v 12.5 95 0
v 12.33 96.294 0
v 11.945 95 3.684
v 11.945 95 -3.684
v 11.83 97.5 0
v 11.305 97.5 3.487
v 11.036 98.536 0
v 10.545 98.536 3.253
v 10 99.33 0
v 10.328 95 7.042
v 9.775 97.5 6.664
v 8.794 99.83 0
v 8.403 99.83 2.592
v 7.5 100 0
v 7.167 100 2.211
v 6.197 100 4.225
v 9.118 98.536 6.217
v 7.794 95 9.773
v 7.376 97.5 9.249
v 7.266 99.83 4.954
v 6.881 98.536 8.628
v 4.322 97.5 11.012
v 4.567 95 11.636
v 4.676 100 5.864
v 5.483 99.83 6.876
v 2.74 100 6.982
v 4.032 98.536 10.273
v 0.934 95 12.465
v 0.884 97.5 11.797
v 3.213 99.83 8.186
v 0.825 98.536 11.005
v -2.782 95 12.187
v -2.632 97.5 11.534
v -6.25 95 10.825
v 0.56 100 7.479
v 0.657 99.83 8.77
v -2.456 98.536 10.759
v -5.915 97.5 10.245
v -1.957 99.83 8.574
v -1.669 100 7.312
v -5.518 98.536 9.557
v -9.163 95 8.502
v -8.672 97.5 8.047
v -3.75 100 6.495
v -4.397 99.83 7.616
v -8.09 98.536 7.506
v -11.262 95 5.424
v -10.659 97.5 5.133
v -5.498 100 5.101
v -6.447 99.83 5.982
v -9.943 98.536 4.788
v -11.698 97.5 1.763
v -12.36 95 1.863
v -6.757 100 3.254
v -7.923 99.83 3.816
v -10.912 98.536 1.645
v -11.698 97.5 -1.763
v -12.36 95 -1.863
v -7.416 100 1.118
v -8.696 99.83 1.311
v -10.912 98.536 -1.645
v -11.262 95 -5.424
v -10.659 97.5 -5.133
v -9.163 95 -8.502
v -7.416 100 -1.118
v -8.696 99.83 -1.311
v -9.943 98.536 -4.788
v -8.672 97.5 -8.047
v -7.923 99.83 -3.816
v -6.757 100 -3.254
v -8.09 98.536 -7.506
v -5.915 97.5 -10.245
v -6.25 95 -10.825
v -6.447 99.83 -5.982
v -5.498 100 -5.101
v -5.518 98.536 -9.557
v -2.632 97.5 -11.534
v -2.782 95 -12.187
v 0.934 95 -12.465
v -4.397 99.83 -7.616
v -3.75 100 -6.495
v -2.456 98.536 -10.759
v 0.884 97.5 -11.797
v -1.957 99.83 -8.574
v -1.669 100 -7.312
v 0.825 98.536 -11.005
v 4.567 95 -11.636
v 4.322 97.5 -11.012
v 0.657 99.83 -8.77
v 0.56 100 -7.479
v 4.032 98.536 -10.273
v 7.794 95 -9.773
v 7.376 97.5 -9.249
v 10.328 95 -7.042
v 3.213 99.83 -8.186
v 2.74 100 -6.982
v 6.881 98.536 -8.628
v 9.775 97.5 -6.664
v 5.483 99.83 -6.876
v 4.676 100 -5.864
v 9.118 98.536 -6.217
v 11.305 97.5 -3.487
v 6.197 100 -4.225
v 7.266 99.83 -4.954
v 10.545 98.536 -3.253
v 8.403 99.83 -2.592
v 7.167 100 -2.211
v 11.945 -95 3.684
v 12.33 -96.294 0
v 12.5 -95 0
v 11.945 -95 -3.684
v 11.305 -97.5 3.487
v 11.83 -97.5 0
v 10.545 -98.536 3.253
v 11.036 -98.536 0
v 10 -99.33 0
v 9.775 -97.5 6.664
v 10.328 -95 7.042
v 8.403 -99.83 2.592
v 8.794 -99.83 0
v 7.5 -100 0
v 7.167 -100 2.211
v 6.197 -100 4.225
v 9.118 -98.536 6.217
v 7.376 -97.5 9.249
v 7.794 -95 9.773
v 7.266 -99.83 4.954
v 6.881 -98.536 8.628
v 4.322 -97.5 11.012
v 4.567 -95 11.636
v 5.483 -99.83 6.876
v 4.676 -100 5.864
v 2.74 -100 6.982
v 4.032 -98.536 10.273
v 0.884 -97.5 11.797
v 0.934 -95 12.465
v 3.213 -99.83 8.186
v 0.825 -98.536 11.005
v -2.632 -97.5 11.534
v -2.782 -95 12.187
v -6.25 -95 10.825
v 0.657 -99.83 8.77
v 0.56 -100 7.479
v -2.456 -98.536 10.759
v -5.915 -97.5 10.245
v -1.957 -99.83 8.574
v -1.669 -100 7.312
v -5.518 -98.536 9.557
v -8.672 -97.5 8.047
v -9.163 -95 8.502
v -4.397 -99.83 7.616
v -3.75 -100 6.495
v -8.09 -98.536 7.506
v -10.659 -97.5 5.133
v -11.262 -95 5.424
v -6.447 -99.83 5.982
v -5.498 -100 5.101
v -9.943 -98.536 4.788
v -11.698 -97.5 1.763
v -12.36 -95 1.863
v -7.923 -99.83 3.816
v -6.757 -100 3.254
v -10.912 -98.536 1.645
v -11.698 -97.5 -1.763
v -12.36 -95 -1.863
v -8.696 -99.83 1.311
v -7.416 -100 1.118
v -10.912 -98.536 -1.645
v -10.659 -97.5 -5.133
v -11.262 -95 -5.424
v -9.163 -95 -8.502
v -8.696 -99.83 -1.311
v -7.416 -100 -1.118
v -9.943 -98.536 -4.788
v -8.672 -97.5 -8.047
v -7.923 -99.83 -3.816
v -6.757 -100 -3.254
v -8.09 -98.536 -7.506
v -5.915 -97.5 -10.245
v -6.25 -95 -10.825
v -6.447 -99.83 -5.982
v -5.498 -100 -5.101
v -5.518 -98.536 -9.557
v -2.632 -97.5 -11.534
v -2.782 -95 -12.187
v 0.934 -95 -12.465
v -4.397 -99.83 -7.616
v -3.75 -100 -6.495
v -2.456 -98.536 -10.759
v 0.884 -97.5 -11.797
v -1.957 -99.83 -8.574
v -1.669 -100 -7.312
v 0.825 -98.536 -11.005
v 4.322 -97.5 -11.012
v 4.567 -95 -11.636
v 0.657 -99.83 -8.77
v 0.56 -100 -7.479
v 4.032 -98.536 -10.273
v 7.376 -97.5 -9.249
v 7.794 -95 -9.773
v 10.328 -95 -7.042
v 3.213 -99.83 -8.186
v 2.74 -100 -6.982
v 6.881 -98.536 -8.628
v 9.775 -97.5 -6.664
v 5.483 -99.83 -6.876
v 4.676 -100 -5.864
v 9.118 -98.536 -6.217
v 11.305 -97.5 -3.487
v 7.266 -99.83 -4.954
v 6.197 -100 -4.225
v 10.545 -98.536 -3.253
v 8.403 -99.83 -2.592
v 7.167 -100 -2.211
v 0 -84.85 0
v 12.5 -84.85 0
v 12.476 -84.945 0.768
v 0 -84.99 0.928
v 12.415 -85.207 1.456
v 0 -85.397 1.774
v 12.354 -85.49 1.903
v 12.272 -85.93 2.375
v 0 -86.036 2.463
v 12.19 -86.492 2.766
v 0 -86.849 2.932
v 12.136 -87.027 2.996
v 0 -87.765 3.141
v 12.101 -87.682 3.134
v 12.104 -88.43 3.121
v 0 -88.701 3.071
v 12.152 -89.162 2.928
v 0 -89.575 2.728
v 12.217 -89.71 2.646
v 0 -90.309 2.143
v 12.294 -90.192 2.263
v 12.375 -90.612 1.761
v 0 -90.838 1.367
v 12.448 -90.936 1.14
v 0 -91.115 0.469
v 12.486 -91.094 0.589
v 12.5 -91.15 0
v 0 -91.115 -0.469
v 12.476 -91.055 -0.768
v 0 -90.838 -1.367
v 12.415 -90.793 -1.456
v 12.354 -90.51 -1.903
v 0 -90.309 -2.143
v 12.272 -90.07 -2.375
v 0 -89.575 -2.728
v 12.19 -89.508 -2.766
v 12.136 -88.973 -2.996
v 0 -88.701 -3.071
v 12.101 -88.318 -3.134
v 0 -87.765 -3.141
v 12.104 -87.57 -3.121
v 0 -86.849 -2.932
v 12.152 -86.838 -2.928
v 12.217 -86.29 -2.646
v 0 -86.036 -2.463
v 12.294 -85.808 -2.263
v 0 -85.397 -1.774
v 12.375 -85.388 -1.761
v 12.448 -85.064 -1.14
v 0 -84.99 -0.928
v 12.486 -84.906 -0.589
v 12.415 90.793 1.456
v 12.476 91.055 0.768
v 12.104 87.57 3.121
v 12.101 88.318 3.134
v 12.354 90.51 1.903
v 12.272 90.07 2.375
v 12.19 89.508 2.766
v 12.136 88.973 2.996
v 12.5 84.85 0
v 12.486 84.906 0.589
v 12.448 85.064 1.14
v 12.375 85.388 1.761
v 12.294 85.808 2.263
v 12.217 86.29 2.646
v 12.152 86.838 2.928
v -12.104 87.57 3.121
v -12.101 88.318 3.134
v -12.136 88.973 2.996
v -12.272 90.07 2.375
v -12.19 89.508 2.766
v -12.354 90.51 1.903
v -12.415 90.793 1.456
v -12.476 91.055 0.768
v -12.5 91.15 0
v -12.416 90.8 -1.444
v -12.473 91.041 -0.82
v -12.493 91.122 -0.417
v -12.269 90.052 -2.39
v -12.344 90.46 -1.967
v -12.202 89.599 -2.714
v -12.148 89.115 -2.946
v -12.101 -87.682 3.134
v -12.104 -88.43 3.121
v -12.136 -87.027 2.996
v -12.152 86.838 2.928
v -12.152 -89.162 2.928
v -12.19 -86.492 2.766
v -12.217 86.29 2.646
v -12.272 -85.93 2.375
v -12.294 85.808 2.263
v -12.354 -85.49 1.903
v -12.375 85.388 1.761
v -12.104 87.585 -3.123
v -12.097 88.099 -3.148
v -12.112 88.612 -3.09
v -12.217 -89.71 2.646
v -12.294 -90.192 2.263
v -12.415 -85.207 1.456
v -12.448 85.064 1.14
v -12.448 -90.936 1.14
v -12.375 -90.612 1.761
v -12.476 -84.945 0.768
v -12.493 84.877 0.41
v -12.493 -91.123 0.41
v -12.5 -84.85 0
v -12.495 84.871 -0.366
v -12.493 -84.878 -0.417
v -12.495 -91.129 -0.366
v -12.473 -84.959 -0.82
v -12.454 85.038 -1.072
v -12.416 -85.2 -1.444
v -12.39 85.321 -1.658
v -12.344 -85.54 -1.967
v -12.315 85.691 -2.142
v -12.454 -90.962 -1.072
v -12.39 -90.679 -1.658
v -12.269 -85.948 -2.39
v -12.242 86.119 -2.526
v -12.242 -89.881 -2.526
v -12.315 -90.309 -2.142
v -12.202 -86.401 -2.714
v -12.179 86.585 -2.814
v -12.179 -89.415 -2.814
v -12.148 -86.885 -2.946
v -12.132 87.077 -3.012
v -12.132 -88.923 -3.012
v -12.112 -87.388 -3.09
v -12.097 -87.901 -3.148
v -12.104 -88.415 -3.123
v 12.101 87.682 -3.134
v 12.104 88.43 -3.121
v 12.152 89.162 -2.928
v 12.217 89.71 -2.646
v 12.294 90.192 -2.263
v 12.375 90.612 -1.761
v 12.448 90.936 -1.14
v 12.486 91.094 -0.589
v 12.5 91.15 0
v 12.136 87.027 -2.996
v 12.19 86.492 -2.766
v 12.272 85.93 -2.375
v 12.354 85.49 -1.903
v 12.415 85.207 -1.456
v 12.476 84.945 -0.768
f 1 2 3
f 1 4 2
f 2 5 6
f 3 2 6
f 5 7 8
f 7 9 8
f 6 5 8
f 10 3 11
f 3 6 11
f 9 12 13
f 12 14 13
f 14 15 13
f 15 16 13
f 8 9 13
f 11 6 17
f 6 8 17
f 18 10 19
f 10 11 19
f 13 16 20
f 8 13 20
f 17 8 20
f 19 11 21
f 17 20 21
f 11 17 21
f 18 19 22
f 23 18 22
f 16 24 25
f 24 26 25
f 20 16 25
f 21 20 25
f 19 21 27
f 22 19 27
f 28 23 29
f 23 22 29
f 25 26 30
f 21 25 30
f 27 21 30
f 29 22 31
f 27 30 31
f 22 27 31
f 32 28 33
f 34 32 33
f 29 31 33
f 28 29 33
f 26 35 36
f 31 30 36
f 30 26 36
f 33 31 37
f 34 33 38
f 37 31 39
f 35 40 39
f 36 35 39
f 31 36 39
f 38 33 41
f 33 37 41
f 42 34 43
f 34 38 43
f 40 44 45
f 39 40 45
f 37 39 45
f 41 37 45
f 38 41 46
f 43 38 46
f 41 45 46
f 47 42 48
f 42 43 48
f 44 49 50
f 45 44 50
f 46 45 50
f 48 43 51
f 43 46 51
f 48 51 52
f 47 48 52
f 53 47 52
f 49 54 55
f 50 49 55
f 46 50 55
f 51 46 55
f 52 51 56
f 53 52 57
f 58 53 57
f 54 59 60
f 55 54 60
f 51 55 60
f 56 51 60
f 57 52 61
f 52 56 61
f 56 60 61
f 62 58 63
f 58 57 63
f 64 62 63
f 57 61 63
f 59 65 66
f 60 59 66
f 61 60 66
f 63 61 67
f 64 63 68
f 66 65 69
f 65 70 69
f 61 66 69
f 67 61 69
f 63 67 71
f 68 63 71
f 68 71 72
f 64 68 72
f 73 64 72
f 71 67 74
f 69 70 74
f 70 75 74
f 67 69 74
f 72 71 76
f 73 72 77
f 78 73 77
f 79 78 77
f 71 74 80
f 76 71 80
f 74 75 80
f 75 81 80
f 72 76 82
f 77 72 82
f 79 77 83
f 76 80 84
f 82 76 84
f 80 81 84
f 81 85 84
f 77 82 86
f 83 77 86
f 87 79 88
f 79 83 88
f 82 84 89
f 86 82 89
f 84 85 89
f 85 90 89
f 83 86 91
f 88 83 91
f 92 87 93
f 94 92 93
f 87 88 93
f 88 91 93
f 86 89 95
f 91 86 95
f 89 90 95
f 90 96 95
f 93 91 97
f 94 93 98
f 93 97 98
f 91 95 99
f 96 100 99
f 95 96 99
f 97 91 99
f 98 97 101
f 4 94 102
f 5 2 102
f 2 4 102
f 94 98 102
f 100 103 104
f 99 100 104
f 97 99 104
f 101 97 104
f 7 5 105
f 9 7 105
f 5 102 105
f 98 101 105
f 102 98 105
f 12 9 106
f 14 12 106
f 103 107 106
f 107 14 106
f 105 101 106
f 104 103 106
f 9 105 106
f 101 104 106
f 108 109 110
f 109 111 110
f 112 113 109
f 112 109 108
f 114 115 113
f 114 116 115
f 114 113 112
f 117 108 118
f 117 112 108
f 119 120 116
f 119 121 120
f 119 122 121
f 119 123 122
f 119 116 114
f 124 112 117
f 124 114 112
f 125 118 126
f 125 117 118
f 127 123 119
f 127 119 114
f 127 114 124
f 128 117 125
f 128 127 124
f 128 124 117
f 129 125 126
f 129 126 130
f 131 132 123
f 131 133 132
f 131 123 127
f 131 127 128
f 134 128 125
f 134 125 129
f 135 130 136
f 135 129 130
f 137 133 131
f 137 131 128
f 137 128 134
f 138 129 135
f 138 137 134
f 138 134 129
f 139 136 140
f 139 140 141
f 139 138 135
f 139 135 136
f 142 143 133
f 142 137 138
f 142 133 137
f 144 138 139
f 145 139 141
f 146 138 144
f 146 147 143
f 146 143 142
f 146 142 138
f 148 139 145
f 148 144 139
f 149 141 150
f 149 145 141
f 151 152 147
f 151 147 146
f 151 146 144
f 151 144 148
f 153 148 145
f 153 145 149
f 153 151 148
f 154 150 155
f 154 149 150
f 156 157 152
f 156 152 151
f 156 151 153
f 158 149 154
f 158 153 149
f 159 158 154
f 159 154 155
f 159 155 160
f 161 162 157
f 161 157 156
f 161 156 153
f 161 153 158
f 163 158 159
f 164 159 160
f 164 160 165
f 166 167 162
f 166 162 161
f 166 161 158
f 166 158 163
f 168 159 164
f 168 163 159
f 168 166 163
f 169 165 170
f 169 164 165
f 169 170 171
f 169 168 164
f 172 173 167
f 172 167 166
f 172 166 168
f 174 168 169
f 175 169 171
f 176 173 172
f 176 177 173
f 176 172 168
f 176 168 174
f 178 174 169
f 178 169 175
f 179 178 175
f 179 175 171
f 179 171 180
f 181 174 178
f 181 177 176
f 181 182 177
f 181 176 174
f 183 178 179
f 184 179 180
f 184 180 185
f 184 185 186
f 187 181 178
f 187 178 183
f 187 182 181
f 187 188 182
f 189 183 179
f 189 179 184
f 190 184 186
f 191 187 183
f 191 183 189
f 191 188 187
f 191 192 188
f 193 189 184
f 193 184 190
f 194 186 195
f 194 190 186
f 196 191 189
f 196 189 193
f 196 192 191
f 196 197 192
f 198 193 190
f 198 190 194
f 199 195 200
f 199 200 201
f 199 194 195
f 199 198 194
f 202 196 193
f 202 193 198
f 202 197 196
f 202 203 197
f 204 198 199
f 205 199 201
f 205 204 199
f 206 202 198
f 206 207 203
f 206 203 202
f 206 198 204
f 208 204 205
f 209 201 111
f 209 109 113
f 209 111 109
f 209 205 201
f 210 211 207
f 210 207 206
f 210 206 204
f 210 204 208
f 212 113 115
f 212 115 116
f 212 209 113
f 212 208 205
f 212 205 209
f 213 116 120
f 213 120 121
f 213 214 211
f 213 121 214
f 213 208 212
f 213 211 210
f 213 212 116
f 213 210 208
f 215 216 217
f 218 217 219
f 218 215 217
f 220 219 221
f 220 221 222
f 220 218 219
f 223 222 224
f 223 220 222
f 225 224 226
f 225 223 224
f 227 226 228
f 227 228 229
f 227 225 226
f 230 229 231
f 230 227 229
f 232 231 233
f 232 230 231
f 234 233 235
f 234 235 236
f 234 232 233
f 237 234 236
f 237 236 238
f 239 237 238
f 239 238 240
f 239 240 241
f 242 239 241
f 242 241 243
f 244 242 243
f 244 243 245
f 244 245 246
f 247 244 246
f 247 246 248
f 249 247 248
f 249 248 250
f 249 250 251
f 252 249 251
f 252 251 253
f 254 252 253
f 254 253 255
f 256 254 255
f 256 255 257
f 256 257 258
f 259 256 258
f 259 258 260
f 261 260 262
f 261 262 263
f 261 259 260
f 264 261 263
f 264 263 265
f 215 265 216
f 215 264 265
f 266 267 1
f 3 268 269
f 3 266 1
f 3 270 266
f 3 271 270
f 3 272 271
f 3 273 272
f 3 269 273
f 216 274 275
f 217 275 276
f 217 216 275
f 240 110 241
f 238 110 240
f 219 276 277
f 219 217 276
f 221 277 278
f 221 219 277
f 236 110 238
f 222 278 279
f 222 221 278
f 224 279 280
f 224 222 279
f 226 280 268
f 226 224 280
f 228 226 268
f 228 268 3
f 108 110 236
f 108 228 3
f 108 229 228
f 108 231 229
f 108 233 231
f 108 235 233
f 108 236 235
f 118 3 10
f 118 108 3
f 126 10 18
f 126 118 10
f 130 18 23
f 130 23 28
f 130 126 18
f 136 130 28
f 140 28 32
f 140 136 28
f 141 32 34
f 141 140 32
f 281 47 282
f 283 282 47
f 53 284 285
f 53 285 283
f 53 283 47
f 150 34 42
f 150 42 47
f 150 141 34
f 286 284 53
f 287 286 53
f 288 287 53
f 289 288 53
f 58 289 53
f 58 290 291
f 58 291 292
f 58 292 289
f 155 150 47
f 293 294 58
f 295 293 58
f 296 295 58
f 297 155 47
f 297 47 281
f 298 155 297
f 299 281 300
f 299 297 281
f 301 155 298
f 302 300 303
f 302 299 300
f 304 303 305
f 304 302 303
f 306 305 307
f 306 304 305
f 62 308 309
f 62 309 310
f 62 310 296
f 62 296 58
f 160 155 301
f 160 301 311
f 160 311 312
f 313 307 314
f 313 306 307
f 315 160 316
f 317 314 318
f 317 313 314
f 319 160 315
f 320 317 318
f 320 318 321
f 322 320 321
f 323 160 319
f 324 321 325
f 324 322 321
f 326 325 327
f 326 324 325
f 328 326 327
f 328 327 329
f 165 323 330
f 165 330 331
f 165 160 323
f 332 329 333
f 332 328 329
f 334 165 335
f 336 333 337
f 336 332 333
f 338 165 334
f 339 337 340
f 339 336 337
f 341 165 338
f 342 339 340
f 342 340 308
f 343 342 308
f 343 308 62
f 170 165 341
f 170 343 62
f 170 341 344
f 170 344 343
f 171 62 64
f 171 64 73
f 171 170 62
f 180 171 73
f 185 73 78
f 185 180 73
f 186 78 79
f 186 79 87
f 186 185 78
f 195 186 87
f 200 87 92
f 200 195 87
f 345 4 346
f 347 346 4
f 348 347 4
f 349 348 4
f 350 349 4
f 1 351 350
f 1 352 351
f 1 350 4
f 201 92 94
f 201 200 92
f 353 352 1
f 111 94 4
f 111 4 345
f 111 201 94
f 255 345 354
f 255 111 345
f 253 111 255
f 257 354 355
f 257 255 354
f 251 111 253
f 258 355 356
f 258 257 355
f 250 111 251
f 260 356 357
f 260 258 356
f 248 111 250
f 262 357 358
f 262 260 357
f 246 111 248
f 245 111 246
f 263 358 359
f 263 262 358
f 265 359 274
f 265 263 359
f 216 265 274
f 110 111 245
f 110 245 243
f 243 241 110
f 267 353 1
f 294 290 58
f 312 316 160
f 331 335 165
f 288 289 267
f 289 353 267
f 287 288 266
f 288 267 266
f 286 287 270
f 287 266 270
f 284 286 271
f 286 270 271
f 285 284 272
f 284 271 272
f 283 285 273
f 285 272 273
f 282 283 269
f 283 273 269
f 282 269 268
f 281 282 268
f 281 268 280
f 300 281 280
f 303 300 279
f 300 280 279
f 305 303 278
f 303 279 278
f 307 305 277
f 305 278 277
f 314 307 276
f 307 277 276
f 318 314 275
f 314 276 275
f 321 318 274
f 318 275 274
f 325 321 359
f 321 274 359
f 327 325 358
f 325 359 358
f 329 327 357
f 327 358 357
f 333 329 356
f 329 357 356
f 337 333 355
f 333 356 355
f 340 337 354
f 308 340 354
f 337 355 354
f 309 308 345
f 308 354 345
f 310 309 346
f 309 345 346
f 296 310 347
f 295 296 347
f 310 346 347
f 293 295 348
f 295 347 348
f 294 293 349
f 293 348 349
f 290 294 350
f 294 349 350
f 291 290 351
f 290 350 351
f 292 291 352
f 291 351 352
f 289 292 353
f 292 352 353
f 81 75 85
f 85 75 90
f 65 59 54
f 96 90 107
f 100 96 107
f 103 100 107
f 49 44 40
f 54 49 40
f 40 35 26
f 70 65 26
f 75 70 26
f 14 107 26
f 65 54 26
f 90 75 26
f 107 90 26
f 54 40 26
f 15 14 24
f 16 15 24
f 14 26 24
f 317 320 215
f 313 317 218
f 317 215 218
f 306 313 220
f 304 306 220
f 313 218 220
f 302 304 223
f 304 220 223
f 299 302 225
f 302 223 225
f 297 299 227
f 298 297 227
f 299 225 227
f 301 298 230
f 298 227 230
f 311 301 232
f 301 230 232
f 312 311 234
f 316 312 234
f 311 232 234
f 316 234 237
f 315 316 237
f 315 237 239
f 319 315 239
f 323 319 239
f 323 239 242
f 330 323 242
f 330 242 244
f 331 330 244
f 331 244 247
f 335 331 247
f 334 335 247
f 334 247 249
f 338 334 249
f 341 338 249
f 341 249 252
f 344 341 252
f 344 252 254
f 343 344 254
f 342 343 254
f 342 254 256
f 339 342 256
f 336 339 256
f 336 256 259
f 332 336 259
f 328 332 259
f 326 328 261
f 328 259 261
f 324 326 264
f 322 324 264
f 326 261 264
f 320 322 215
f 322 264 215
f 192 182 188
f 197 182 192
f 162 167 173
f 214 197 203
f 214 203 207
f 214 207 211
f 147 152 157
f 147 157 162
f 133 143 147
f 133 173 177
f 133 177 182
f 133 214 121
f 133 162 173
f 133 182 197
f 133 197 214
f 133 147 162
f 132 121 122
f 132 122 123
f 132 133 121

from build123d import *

# Parameters (mm, degrees)
F0_R     = 12.5
F2_DEPTH = 100
F1_R     = 3.15
F3_DEPTH = 200
F4_R     = 5


with BuildPart() as f2:
    # F0 (on Front) → F2 (new body, symmetric)
    with BuildSketch(Plane.XZ):
        Circle(F0_R)
    extrude(amount=F2_DEPTH, both=True)

    # F1 (on Right) → F3 (cut, symmetric)
    with BuildSketch(Plane.YZ):
        with Locations((-88, 0)):
            Circle(F1_R)
        with Locations((88, 0)):
            Circle(F1_R)
    extrude(amount=F3_DEPTH, both=True, mode=Mode.SUBTRACT)

    # F4
    f4_edges = [f2.edges().sort_by_distance(p)[0] for p in [
        (-12.5, -100, 0),
        (-12.5, 100, 0),
    ]]
    fillet(f4_edges, radius=F4_R)


solid = f2.part
